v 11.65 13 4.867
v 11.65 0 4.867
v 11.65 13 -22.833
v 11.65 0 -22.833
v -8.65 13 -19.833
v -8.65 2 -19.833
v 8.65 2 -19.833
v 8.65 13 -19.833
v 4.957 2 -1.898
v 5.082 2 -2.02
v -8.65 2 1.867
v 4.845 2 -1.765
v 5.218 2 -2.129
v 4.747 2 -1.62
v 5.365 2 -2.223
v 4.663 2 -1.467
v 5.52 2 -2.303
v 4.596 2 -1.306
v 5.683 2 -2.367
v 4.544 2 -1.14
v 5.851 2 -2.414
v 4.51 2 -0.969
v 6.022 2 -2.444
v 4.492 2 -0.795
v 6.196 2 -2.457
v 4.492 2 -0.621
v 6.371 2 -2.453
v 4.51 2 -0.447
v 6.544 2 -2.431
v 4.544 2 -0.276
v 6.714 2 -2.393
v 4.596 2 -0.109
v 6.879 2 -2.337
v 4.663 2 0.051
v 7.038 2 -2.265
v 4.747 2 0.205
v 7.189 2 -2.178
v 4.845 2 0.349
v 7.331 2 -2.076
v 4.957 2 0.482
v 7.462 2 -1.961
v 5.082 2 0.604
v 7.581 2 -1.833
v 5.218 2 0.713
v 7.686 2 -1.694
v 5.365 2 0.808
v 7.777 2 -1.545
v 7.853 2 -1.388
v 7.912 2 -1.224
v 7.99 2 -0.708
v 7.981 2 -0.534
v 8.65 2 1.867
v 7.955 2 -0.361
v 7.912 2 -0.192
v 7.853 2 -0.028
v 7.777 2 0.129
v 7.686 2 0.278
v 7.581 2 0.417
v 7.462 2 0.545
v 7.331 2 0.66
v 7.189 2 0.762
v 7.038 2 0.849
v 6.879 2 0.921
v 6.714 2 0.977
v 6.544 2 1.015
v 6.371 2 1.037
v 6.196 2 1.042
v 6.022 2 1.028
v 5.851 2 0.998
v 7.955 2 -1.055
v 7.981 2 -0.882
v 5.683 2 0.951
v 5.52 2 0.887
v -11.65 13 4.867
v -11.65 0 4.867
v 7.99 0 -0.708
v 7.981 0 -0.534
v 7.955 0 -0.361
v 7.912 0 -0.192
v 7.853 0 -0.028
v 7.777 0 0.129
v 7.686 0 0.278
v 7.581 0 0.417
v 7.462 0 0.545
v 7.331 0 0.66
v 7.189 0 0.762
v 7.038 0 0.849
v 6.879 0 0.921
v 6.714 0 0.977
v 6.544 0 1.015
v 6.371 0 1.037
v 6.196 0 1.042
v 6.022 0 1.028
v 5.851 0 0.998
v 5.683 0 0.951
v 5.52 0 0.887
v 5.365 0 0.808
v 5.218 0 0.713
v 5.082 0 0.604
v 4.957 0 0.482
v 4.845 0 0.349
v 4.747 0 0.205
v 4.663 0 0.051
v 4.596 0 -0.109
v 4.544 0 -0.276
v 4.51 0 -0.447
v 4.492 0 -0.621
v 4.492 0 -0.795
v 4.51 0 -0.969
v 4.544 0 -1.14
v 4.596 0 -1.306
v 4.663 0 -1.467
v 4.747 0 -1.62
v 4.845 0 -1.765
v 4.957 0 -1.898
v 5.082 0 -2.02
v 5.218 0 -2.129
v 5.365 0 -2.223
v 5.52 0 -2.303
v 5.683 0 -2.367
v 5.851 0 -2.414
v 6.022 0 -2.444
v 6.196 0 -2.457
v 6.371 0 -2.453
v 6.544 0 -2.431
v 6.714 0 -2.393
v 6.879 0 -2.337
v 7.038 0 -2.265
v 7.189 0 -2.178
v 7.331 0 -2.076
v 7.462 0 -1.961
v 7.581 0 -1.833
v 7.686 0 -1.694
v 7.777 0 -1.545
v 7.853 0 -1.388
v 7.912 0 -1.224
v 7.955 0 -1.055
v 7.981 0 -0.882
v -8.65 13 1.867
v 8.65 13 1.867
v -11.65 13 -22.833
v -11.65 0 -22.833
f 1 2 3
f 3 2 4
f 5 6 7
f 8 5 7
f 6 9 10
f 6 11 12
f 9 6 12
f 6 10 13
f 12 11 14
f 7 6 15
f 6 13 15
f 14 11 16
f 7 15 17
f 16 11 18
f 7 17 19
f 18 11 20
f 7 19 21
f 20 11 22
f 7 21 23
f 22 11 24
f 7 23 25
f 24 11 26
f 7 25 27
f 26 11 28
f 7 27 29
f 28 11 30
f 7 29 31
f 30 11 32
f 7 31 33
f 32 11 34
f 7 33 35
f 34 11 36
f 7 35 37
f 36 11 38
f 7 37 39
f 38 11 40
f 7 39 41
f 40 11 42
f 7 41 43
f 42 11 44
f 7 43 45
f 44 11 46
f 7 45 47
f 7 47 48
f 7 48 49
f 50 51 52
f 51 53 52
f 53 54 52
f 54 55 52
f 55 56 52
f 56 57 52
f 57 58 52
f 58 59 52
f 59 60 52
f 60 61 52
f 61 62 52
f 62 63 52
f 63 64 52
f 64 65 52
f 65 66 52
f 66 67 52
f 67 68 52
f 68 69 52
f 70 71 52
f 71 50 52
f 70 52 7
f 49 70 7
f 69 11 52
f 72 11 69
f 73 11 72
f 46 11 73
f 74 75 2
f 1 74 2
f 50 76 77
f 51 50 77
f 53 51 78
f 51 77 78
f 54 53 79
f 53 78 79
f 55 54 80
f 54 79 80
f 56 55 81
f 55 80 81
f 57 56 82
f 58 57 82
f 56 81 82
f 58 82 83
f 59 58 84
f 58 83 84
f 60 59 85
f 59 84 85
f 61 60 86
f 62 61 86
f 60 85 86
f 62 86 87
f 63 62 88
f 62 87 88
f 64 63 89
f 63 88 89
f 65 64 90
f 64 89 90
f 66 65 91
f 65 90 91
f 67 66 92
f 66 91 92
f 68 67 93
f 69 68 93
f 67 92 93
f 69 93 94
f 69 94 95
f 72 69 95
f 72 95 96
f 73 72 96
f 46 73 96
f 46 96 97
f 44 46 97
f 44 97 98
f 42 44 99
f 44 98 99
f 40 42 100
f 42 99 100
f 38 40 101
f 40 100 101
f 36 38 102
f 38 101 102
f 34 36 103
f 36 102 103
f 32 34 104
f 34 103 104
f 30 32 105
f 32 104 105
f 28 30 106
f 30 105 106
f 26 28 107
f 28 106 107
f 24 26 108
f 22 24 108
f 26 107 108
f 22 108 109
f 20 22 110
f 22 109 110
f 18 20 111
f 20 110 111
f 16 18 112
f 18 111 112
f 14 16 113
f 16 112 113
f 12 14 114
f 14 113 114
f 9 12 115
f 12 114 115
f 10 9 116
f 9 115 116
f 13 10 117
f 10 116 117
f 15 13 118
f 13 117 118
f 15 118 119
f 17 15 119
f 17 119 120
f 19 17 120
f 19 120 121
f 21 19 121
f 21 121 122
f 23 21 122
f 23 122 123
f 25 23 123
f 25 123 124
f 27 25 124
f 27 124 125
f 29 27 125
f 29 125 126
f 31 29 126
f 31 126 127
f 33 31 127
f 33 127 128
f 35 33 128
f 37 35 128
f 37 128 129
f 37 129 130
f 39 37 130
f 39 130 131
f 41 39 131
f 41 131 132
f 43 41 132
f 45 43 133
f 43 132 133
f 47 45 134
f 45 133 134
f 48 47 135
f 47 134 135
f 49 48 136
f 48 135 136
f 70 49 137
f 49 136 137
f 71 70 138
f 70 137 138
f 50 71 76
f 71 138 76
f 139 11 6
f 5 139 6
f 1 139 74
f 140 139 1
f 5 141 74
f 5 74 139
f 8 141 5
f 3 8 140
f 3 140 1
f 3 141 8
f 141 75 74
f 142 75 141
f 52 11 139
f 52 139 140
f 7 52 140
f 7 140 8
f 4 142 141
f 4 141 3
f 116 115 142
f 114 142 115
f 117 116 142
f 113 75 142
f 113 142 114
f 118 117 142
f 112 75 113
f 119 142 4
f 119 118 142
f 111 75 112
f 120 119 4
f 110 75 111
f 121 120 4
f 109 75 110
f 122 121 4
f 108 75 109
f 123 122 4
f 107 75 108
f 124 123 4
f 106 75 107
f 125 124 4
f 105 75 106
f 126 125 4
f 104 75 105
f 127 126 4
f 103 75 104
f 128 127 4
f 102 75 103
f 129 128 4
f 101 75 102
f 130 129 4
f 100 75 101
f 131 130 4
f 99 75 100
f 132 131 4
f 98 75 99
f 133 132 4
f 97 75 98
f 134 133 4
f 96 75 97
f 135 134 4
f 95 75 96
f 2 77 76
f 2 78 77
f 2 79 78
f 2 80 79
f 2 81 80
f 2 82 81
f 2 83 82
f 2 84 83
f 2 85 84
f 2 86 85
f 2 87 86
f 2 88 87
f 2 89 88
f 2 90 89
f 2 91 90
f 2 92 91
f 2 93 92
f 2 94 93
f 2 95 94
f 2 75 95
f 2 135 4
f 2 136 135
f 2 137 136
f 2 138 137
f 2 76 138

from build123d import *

# Parameters (mm, degrees)
SKETCH1_W           = 23.3
SKETCH1_H           = 27.7
SKETCH1_W_2         = 17.3
SKETCH1_H_2         = 21.7
BOSS_EXTRUDE1_DEPTH = 13
SKETCH2_W           = 17.3
SKETCH2_H           = 21.7
SKETCH2_R           = 1.75
BOSS_EXTRUDE2_DEPTH = 2


with BuildPart() as part:
    # Sketch1 → Boss-Extrude1 (new body)
    with BuildSketch(Plane(origin=(0, 0, 0), x_dir=(1, 0, 0), z_dir=(0, 1, 0))):
        with Locations((0, 8.983417287)):
            Rectangle(SKETCH1_W, SKETCH1_H)
        with Locations((0, 8.983417287)):
            Rectangle(SKETCH1_W_2, SKETCH1_H_2, mode=Mode.SUBTRACT)
    extrude(amount=BOSS_EXTRUDE1_DEPTH)

    # Sketch2 → Boss-Extrude2 (add)
    with BuildSketch(Plane.XZ):
        with Locations((0, -8.983417287)):
            Rectangle(SKETCH2_W, SKETCH2_H)
        with Locations((6.24, -0.707949912)):
            Circle(SKETCH2_R, mode=Mode.SUBTRACT)
    extrude(amount=-BOSS_EXTRUDE2_DEPTH)


solid = part.part
